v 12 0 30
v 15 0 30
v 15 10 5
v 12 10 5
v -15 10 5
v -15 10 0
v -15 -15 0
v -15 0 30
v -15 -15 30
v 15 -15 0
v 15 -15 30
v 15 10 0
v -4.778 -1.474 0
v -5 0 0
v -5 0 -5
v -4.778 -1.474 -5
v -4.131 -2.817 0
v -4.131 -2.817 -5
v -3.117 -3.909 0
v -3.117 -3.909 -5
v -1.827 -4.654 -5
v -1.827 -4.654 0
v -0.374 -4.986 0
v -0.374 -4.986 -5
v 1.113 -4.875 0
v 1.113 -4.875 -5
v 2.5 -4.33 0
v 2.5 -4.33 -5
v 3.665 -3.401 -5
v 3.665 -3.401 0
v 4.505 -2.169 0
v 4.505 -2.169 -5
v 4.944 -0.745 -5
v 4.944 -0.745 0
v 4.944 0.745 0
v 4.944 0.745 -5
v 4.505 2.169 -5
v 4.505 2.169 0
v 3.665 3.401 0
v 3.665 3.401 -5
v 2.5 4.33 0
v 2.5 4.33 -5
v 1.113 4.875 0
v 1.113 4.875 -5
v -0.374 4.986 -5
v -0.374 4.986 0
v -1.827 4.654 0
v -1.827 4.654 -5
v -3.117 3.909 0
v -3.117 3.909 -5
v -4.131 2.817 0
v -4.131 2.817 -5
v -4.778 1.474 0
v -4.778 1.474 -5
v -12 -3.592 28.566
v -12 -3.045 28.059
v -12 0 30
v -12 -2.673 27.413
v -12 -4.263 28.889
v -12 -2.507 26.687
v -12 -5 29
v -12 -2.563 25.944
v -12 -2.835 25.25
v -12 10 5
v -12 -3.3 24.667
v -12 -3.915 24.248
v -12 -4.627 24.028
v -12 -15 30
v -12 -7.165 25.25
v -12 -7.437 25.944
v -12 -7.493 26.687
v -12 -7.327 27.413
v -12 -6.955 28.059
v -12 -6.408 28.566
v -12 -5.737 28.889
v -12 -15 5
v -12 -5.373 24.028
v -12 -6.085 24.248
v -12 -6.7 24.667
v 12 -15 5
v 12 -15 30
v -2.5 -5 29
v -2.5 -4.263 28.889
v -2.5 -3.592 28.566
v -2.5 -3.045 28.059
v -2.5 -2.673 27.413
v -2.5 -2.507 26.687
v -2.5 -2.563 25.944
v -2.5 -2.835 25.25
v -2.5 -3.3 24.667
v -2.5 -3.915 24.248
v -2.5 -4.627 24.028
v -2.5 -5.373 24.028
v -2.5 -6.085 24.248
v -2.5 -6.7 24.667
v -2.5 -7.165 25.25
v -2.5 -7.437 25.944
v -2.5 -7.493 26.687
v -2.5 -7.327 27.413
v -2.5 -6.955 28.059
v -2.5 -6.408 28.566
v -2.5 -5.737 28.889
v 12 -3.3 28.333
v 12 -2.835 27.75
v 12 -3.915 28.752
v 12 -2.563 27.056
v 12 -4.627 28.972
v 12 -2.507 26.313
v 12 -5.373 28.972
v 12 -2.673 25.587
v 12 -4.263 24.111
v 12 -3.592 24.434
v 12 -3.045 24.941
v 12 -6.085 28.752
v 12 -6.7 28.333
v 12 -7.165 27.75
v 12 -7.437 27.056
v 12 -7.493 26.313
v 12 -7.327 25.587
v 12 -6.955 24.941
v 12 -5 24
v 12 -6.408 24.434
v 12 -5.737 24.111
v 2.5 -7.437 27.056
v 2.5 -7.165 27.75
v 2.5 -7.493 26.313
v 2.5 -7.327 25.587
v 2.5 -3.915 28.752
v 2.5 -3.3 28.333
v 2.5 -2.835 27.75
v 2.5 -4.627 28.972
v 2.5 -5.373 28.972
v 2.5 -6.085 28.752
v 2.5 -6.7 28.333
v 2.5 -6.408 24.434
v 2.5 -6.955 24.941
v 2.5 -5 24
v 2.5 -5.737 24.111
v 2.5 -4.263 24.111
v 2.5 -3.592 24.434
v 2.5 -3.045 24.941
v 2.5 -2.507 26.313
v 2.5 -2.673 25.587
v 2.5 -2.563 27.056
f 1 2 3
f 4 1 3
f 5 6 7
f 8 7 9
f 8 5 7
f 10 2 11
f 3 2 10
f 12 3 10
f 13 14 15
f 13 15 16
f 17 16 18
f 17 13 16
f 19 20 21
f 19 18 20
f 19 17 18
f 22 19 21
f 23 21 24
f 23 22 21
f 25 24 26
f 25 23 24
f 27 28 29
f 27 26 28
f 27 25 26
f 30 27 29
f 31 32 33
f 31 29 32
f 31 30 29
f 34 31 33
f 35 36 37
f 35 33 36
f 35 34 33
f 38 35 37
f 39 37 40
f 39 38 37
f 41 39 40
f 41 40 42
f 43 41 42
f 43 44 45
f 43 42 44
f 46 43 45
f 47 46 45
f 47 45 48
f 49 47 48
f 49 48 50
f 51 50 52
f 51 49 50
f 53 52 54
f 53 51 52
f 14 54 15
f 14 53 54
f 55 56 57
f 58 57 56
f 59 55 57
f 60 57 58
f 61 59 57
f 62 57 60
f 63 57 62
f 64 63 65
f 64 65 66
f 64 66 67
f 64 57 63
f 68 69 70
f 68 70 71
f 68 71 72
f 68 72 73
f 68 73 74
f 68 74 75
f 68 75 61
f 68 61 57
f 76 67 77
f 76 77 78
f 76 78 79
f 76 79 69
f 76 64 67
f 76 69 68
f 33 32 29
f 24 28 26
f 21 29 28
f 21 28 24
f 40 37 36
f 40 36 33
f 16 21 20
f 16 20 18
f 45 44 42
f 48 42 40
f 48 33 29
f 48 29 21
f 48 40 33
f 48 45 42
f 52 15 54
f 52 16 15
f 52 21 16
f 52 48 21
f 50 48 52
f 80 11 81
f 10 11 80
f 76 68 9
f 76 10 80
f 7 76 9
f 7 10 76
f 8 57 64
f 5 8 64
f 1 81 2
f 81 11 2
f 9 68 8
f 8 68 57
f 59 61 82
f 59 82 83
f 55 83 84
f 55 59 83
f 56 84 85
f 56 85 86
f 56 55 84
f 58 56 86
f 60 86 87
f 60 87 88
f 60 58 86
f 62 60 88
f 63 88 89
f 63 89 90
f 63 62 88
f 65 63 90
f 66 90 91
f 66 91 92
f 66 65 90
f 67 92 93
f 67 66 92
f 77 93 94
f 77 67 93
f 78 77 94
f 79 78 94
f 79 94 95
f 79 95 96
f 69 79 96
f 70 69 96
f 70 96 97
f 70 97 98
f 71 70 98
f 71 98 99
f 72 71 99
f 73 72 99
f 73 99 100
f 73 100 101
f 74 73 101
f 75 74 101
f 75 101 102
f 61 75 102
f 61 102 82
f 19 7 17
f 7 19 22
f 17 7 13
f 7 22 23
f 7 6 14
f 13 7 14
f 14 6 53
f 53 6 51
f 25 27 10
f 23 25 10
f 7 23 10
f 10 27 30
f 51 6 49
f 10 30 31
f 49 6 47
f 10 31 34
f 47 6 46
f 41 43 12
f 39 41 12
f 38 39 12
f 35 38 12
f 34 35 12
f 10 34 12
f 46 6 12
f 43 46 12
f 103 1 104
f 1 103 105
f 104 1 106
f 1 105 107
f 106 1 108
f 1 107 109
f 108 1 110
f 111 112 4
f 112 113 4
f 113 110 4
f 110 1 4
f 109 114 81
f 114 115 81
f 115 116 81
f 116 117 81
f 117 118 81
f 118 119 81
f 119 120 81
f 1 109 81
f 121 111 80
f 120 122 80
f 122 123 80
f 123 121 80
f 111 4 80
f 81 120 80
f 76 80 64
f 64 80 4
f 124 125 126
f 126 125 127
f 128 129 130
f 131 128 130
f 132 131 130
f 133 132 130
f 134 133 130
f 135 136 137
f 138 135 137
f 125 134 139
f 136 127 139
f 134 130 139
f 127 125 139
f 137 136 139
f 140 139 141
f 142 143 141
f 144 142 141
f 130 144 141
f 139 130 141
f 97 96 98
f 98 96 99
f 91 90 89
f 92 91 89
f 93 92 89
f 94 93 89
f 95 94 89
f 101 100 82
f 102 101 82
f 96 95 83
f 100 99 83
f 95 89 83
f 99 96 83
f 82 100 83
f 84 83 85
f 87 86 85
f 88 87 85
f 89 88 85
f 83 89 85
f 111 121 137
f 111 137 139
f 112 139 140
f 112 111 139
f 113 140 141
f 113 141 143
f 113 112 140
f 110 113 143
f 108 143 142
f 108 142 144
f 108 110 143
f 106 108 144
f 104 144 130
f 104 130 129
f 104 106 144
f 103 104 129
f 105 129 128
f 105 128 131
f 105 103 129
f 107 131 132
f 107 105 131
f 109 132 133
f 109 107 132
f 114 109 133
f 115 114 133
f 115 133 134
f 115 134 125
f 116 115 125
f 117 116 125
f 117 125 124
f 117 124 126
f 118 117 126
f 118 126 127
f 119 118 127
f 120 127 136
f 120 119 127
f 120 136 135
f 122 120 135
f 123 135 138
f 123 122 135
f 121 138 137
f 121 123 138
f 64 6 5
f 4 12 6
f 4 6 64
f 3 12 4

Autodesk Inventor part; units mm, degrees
ref_plane "YZ Plane" through (0, 0, 0) normal (1, 0, 0) x (0, 1, 0)
ref_plane "XZ Plane" through (0, 0, 0) normal (0, 1, 0) x (-1, 0, 0)
ref_plane "XY Plane" through (0, 0, 0) normal (0, 0, 1) x (1, 0, 0)
sketch "스케치1" plane through (0, 0, 0) normal (0, 0, 1) x (1, 0, 0)
  line L0 (15, -15) -> (-15, -15)
  line L1 (-15, -15) -> (-15, 15)
  line L2 (-15, 15) -> (15, 15)
  line L3 (15, 15) -> (15, -15)
  line L4 (15, -15) -> (-15, 15) construction
  line L5 (-15, -15) -> (15, 15) construction
  point P0 (0, 0)
  dimension "d0" = 30
  dimension "d1" = 30
extrude "돌출1" add sketch "스케치1" along normal blind 5
sketch "스케치2" plane through (0, 0, 5) normal (0, 0, 1) x (1, 0, 0)
  line L0 (-15, 15) -> (-15, -15) projected
  line L1 (-15, -15) -> (15, -15) projected
  line L2 (-15, 15) -> (-12, 15)
  line L3 (-12, 15) -> (-12, -15)
  line L4 (-12, -15) -> (-15, -15)
  line L5 (-15, -15) -> (-15, 15)
  line L6 (15, -15) -> (15, 15) projected
  line L7 (15, 15) -> (12, 15)
  line L8 (12, 15) -> (12, -15)
  line L9 (12, -15) -> (15, -15)
  line L10 (15, -15) -> (15, 15)
  point P0 (0, 0)
  dimension "d4" = 3
  dimension "d5" = 3
extrude "돌출2" add sketch "스케치2" along normal blind 30
sketch "스케치3" plane through (0, 0, 0) normal (0, 0, -1) x (-1, 0, 0)
  circle A0 centre (0, 0) radius 5
  dimension "d8" = 10
extrude "돌출3" add sketch "스케치3" along normal blind 5
sketch "스케치4" plane through (15, -15, 0) normal (1, 0, 0) x (0, 0, -1)
  line L0 (0, 0) -> (-39, 0)
  line L1 (-39, 0) -> (-26.5, 0)
  line L2 (-5, 0) -> (-35, 0) projected
  line L3 (-26.5, 0) -> (-26.5, 10)
  circle A0 centre (-26.5, 10) radius 2.5
  point P0 (0, 15)
  dimension "d11" = 39
  dimension "d12" = 12.5
  dimension "d13" = 5
  dimension "d14" = 10
extrude "돌출4" add sketch "스케치4" against normal blind 12.5
sketch "스케치5" plane through (-15, -15, 0) normal (-1, 0, 0) x (0, 0, 1)
  circle A0 centre (26.5, 10) radius 2.5 projected
  point P0 (0, 15)
extrude "돌출5" add sketch "스케치5" against normal blind 12.5
sketch "스케치6" plane through (15, -15, 0) normal (1, 0, 0) x (0, 0, -1)
  line L0 (0, 30) -> (-35, 30) projected
  line L1 (-5, 30) -> (-35, 30) projected
  line L2 (-5, 30) -> (-35, 30) projected
  line L3 (0, 30) -> (-35, 30) projected
  line L4 (-5, 0) -> (-5, 30) projected
  line L5 (-5, 30) -> (-5, 0) projected
  line L6 (0, 30) -> (-35, 30) projected
  line L7 (-5, 30) -> (-5, 0) projected
  line L8 (0, 30) -> (-5, 30)
  line L9 (-5, 30) -> (-10, 30)
  line L10 (-5, 30) -> (-35, 30) projected
  line L11 (-35, 0) -> (-35, 30) projected
  line L12 (-10, 30) -> (-35, 30)
  line L13 (-35, 30) -> (-35, 20)
  line L14 (-35, 20) -> (-10, 30)
  circle A0 centre (-26.5, 10) radius 2.5 projected
  line L15 (0, 0) -> (-35, 0) projected
  line L16 (-35, 0) -> (-30, 0)
  line L17 (-30, 0) -> (-30, 22)
  point P0 (0, 15)
  dimension "d19" = 5
  dimension "d20" = 5
  dimension "d21" = 10
  dimension "d22" = 5
extrude "돌출6" cut sketch "스케치6" against normal through all contours L14 L11 L0 | L17 L15 L11 L14
sketch "스케치7" plane through (15, -15, 0) normal (1, 0, 0) x (0, 0, -1)
  line L0 (-5, 0) -> (-5, 30) projected
  line L1 (-5, 30) -> (-5, 25)
  line L2 (-5, 30) -> (-5, 0) projected
  line L3 (-5, 25) -> (-30, 25)
  line L4 (-30, 22) -> (-30, 0) projected
  circle A0 centre (-26.5, 10) radius 2.5 projected
  line L5 (-30, 25) -> (-30, 15)
  line L6 (-30, 15) -> (-5, 25)
  line L7 (-30, 22) -> (-30, 0) projected
  line L8 (0, 0) -> (-30, 0) projected
  line L9 (0, 0) -> (0, 30) projected
  line L10 (0, 30) -> (-10, 30) projected
  line L11 (-10, 30) -> (-30, 22) projected
  point P0 (0, 15)
  dimension "d25" = 5
  dimension "d26" = 10
extrude "돌출7" cut sketch "스케치7" against normal through all contours L3 L11 L10 L0 | L6 L4 L11 L3
sketch "스케치8" plane through (15, -15, 0) normal (1, 0, 0) x (0, 0, -1)
  line L0 (0, 0) -> (0, 30) projected
  line L1 (0, 30) -> (0, 25)
  line L2 (0, 25) -> (-5, 25)
  line L3 (0, 30) -> (-5, 30) projected
  line L4 (-5, 25) -> (-5, 30)
  line L5 (0, 30) -> (-5, 30)
  point P0 (0, 15)
  dimension "d29" = 5
extrude "돌출8" cut sketch "스케치8" against normal through all
properties part number "castor_link" material "알루미늄 6061"
